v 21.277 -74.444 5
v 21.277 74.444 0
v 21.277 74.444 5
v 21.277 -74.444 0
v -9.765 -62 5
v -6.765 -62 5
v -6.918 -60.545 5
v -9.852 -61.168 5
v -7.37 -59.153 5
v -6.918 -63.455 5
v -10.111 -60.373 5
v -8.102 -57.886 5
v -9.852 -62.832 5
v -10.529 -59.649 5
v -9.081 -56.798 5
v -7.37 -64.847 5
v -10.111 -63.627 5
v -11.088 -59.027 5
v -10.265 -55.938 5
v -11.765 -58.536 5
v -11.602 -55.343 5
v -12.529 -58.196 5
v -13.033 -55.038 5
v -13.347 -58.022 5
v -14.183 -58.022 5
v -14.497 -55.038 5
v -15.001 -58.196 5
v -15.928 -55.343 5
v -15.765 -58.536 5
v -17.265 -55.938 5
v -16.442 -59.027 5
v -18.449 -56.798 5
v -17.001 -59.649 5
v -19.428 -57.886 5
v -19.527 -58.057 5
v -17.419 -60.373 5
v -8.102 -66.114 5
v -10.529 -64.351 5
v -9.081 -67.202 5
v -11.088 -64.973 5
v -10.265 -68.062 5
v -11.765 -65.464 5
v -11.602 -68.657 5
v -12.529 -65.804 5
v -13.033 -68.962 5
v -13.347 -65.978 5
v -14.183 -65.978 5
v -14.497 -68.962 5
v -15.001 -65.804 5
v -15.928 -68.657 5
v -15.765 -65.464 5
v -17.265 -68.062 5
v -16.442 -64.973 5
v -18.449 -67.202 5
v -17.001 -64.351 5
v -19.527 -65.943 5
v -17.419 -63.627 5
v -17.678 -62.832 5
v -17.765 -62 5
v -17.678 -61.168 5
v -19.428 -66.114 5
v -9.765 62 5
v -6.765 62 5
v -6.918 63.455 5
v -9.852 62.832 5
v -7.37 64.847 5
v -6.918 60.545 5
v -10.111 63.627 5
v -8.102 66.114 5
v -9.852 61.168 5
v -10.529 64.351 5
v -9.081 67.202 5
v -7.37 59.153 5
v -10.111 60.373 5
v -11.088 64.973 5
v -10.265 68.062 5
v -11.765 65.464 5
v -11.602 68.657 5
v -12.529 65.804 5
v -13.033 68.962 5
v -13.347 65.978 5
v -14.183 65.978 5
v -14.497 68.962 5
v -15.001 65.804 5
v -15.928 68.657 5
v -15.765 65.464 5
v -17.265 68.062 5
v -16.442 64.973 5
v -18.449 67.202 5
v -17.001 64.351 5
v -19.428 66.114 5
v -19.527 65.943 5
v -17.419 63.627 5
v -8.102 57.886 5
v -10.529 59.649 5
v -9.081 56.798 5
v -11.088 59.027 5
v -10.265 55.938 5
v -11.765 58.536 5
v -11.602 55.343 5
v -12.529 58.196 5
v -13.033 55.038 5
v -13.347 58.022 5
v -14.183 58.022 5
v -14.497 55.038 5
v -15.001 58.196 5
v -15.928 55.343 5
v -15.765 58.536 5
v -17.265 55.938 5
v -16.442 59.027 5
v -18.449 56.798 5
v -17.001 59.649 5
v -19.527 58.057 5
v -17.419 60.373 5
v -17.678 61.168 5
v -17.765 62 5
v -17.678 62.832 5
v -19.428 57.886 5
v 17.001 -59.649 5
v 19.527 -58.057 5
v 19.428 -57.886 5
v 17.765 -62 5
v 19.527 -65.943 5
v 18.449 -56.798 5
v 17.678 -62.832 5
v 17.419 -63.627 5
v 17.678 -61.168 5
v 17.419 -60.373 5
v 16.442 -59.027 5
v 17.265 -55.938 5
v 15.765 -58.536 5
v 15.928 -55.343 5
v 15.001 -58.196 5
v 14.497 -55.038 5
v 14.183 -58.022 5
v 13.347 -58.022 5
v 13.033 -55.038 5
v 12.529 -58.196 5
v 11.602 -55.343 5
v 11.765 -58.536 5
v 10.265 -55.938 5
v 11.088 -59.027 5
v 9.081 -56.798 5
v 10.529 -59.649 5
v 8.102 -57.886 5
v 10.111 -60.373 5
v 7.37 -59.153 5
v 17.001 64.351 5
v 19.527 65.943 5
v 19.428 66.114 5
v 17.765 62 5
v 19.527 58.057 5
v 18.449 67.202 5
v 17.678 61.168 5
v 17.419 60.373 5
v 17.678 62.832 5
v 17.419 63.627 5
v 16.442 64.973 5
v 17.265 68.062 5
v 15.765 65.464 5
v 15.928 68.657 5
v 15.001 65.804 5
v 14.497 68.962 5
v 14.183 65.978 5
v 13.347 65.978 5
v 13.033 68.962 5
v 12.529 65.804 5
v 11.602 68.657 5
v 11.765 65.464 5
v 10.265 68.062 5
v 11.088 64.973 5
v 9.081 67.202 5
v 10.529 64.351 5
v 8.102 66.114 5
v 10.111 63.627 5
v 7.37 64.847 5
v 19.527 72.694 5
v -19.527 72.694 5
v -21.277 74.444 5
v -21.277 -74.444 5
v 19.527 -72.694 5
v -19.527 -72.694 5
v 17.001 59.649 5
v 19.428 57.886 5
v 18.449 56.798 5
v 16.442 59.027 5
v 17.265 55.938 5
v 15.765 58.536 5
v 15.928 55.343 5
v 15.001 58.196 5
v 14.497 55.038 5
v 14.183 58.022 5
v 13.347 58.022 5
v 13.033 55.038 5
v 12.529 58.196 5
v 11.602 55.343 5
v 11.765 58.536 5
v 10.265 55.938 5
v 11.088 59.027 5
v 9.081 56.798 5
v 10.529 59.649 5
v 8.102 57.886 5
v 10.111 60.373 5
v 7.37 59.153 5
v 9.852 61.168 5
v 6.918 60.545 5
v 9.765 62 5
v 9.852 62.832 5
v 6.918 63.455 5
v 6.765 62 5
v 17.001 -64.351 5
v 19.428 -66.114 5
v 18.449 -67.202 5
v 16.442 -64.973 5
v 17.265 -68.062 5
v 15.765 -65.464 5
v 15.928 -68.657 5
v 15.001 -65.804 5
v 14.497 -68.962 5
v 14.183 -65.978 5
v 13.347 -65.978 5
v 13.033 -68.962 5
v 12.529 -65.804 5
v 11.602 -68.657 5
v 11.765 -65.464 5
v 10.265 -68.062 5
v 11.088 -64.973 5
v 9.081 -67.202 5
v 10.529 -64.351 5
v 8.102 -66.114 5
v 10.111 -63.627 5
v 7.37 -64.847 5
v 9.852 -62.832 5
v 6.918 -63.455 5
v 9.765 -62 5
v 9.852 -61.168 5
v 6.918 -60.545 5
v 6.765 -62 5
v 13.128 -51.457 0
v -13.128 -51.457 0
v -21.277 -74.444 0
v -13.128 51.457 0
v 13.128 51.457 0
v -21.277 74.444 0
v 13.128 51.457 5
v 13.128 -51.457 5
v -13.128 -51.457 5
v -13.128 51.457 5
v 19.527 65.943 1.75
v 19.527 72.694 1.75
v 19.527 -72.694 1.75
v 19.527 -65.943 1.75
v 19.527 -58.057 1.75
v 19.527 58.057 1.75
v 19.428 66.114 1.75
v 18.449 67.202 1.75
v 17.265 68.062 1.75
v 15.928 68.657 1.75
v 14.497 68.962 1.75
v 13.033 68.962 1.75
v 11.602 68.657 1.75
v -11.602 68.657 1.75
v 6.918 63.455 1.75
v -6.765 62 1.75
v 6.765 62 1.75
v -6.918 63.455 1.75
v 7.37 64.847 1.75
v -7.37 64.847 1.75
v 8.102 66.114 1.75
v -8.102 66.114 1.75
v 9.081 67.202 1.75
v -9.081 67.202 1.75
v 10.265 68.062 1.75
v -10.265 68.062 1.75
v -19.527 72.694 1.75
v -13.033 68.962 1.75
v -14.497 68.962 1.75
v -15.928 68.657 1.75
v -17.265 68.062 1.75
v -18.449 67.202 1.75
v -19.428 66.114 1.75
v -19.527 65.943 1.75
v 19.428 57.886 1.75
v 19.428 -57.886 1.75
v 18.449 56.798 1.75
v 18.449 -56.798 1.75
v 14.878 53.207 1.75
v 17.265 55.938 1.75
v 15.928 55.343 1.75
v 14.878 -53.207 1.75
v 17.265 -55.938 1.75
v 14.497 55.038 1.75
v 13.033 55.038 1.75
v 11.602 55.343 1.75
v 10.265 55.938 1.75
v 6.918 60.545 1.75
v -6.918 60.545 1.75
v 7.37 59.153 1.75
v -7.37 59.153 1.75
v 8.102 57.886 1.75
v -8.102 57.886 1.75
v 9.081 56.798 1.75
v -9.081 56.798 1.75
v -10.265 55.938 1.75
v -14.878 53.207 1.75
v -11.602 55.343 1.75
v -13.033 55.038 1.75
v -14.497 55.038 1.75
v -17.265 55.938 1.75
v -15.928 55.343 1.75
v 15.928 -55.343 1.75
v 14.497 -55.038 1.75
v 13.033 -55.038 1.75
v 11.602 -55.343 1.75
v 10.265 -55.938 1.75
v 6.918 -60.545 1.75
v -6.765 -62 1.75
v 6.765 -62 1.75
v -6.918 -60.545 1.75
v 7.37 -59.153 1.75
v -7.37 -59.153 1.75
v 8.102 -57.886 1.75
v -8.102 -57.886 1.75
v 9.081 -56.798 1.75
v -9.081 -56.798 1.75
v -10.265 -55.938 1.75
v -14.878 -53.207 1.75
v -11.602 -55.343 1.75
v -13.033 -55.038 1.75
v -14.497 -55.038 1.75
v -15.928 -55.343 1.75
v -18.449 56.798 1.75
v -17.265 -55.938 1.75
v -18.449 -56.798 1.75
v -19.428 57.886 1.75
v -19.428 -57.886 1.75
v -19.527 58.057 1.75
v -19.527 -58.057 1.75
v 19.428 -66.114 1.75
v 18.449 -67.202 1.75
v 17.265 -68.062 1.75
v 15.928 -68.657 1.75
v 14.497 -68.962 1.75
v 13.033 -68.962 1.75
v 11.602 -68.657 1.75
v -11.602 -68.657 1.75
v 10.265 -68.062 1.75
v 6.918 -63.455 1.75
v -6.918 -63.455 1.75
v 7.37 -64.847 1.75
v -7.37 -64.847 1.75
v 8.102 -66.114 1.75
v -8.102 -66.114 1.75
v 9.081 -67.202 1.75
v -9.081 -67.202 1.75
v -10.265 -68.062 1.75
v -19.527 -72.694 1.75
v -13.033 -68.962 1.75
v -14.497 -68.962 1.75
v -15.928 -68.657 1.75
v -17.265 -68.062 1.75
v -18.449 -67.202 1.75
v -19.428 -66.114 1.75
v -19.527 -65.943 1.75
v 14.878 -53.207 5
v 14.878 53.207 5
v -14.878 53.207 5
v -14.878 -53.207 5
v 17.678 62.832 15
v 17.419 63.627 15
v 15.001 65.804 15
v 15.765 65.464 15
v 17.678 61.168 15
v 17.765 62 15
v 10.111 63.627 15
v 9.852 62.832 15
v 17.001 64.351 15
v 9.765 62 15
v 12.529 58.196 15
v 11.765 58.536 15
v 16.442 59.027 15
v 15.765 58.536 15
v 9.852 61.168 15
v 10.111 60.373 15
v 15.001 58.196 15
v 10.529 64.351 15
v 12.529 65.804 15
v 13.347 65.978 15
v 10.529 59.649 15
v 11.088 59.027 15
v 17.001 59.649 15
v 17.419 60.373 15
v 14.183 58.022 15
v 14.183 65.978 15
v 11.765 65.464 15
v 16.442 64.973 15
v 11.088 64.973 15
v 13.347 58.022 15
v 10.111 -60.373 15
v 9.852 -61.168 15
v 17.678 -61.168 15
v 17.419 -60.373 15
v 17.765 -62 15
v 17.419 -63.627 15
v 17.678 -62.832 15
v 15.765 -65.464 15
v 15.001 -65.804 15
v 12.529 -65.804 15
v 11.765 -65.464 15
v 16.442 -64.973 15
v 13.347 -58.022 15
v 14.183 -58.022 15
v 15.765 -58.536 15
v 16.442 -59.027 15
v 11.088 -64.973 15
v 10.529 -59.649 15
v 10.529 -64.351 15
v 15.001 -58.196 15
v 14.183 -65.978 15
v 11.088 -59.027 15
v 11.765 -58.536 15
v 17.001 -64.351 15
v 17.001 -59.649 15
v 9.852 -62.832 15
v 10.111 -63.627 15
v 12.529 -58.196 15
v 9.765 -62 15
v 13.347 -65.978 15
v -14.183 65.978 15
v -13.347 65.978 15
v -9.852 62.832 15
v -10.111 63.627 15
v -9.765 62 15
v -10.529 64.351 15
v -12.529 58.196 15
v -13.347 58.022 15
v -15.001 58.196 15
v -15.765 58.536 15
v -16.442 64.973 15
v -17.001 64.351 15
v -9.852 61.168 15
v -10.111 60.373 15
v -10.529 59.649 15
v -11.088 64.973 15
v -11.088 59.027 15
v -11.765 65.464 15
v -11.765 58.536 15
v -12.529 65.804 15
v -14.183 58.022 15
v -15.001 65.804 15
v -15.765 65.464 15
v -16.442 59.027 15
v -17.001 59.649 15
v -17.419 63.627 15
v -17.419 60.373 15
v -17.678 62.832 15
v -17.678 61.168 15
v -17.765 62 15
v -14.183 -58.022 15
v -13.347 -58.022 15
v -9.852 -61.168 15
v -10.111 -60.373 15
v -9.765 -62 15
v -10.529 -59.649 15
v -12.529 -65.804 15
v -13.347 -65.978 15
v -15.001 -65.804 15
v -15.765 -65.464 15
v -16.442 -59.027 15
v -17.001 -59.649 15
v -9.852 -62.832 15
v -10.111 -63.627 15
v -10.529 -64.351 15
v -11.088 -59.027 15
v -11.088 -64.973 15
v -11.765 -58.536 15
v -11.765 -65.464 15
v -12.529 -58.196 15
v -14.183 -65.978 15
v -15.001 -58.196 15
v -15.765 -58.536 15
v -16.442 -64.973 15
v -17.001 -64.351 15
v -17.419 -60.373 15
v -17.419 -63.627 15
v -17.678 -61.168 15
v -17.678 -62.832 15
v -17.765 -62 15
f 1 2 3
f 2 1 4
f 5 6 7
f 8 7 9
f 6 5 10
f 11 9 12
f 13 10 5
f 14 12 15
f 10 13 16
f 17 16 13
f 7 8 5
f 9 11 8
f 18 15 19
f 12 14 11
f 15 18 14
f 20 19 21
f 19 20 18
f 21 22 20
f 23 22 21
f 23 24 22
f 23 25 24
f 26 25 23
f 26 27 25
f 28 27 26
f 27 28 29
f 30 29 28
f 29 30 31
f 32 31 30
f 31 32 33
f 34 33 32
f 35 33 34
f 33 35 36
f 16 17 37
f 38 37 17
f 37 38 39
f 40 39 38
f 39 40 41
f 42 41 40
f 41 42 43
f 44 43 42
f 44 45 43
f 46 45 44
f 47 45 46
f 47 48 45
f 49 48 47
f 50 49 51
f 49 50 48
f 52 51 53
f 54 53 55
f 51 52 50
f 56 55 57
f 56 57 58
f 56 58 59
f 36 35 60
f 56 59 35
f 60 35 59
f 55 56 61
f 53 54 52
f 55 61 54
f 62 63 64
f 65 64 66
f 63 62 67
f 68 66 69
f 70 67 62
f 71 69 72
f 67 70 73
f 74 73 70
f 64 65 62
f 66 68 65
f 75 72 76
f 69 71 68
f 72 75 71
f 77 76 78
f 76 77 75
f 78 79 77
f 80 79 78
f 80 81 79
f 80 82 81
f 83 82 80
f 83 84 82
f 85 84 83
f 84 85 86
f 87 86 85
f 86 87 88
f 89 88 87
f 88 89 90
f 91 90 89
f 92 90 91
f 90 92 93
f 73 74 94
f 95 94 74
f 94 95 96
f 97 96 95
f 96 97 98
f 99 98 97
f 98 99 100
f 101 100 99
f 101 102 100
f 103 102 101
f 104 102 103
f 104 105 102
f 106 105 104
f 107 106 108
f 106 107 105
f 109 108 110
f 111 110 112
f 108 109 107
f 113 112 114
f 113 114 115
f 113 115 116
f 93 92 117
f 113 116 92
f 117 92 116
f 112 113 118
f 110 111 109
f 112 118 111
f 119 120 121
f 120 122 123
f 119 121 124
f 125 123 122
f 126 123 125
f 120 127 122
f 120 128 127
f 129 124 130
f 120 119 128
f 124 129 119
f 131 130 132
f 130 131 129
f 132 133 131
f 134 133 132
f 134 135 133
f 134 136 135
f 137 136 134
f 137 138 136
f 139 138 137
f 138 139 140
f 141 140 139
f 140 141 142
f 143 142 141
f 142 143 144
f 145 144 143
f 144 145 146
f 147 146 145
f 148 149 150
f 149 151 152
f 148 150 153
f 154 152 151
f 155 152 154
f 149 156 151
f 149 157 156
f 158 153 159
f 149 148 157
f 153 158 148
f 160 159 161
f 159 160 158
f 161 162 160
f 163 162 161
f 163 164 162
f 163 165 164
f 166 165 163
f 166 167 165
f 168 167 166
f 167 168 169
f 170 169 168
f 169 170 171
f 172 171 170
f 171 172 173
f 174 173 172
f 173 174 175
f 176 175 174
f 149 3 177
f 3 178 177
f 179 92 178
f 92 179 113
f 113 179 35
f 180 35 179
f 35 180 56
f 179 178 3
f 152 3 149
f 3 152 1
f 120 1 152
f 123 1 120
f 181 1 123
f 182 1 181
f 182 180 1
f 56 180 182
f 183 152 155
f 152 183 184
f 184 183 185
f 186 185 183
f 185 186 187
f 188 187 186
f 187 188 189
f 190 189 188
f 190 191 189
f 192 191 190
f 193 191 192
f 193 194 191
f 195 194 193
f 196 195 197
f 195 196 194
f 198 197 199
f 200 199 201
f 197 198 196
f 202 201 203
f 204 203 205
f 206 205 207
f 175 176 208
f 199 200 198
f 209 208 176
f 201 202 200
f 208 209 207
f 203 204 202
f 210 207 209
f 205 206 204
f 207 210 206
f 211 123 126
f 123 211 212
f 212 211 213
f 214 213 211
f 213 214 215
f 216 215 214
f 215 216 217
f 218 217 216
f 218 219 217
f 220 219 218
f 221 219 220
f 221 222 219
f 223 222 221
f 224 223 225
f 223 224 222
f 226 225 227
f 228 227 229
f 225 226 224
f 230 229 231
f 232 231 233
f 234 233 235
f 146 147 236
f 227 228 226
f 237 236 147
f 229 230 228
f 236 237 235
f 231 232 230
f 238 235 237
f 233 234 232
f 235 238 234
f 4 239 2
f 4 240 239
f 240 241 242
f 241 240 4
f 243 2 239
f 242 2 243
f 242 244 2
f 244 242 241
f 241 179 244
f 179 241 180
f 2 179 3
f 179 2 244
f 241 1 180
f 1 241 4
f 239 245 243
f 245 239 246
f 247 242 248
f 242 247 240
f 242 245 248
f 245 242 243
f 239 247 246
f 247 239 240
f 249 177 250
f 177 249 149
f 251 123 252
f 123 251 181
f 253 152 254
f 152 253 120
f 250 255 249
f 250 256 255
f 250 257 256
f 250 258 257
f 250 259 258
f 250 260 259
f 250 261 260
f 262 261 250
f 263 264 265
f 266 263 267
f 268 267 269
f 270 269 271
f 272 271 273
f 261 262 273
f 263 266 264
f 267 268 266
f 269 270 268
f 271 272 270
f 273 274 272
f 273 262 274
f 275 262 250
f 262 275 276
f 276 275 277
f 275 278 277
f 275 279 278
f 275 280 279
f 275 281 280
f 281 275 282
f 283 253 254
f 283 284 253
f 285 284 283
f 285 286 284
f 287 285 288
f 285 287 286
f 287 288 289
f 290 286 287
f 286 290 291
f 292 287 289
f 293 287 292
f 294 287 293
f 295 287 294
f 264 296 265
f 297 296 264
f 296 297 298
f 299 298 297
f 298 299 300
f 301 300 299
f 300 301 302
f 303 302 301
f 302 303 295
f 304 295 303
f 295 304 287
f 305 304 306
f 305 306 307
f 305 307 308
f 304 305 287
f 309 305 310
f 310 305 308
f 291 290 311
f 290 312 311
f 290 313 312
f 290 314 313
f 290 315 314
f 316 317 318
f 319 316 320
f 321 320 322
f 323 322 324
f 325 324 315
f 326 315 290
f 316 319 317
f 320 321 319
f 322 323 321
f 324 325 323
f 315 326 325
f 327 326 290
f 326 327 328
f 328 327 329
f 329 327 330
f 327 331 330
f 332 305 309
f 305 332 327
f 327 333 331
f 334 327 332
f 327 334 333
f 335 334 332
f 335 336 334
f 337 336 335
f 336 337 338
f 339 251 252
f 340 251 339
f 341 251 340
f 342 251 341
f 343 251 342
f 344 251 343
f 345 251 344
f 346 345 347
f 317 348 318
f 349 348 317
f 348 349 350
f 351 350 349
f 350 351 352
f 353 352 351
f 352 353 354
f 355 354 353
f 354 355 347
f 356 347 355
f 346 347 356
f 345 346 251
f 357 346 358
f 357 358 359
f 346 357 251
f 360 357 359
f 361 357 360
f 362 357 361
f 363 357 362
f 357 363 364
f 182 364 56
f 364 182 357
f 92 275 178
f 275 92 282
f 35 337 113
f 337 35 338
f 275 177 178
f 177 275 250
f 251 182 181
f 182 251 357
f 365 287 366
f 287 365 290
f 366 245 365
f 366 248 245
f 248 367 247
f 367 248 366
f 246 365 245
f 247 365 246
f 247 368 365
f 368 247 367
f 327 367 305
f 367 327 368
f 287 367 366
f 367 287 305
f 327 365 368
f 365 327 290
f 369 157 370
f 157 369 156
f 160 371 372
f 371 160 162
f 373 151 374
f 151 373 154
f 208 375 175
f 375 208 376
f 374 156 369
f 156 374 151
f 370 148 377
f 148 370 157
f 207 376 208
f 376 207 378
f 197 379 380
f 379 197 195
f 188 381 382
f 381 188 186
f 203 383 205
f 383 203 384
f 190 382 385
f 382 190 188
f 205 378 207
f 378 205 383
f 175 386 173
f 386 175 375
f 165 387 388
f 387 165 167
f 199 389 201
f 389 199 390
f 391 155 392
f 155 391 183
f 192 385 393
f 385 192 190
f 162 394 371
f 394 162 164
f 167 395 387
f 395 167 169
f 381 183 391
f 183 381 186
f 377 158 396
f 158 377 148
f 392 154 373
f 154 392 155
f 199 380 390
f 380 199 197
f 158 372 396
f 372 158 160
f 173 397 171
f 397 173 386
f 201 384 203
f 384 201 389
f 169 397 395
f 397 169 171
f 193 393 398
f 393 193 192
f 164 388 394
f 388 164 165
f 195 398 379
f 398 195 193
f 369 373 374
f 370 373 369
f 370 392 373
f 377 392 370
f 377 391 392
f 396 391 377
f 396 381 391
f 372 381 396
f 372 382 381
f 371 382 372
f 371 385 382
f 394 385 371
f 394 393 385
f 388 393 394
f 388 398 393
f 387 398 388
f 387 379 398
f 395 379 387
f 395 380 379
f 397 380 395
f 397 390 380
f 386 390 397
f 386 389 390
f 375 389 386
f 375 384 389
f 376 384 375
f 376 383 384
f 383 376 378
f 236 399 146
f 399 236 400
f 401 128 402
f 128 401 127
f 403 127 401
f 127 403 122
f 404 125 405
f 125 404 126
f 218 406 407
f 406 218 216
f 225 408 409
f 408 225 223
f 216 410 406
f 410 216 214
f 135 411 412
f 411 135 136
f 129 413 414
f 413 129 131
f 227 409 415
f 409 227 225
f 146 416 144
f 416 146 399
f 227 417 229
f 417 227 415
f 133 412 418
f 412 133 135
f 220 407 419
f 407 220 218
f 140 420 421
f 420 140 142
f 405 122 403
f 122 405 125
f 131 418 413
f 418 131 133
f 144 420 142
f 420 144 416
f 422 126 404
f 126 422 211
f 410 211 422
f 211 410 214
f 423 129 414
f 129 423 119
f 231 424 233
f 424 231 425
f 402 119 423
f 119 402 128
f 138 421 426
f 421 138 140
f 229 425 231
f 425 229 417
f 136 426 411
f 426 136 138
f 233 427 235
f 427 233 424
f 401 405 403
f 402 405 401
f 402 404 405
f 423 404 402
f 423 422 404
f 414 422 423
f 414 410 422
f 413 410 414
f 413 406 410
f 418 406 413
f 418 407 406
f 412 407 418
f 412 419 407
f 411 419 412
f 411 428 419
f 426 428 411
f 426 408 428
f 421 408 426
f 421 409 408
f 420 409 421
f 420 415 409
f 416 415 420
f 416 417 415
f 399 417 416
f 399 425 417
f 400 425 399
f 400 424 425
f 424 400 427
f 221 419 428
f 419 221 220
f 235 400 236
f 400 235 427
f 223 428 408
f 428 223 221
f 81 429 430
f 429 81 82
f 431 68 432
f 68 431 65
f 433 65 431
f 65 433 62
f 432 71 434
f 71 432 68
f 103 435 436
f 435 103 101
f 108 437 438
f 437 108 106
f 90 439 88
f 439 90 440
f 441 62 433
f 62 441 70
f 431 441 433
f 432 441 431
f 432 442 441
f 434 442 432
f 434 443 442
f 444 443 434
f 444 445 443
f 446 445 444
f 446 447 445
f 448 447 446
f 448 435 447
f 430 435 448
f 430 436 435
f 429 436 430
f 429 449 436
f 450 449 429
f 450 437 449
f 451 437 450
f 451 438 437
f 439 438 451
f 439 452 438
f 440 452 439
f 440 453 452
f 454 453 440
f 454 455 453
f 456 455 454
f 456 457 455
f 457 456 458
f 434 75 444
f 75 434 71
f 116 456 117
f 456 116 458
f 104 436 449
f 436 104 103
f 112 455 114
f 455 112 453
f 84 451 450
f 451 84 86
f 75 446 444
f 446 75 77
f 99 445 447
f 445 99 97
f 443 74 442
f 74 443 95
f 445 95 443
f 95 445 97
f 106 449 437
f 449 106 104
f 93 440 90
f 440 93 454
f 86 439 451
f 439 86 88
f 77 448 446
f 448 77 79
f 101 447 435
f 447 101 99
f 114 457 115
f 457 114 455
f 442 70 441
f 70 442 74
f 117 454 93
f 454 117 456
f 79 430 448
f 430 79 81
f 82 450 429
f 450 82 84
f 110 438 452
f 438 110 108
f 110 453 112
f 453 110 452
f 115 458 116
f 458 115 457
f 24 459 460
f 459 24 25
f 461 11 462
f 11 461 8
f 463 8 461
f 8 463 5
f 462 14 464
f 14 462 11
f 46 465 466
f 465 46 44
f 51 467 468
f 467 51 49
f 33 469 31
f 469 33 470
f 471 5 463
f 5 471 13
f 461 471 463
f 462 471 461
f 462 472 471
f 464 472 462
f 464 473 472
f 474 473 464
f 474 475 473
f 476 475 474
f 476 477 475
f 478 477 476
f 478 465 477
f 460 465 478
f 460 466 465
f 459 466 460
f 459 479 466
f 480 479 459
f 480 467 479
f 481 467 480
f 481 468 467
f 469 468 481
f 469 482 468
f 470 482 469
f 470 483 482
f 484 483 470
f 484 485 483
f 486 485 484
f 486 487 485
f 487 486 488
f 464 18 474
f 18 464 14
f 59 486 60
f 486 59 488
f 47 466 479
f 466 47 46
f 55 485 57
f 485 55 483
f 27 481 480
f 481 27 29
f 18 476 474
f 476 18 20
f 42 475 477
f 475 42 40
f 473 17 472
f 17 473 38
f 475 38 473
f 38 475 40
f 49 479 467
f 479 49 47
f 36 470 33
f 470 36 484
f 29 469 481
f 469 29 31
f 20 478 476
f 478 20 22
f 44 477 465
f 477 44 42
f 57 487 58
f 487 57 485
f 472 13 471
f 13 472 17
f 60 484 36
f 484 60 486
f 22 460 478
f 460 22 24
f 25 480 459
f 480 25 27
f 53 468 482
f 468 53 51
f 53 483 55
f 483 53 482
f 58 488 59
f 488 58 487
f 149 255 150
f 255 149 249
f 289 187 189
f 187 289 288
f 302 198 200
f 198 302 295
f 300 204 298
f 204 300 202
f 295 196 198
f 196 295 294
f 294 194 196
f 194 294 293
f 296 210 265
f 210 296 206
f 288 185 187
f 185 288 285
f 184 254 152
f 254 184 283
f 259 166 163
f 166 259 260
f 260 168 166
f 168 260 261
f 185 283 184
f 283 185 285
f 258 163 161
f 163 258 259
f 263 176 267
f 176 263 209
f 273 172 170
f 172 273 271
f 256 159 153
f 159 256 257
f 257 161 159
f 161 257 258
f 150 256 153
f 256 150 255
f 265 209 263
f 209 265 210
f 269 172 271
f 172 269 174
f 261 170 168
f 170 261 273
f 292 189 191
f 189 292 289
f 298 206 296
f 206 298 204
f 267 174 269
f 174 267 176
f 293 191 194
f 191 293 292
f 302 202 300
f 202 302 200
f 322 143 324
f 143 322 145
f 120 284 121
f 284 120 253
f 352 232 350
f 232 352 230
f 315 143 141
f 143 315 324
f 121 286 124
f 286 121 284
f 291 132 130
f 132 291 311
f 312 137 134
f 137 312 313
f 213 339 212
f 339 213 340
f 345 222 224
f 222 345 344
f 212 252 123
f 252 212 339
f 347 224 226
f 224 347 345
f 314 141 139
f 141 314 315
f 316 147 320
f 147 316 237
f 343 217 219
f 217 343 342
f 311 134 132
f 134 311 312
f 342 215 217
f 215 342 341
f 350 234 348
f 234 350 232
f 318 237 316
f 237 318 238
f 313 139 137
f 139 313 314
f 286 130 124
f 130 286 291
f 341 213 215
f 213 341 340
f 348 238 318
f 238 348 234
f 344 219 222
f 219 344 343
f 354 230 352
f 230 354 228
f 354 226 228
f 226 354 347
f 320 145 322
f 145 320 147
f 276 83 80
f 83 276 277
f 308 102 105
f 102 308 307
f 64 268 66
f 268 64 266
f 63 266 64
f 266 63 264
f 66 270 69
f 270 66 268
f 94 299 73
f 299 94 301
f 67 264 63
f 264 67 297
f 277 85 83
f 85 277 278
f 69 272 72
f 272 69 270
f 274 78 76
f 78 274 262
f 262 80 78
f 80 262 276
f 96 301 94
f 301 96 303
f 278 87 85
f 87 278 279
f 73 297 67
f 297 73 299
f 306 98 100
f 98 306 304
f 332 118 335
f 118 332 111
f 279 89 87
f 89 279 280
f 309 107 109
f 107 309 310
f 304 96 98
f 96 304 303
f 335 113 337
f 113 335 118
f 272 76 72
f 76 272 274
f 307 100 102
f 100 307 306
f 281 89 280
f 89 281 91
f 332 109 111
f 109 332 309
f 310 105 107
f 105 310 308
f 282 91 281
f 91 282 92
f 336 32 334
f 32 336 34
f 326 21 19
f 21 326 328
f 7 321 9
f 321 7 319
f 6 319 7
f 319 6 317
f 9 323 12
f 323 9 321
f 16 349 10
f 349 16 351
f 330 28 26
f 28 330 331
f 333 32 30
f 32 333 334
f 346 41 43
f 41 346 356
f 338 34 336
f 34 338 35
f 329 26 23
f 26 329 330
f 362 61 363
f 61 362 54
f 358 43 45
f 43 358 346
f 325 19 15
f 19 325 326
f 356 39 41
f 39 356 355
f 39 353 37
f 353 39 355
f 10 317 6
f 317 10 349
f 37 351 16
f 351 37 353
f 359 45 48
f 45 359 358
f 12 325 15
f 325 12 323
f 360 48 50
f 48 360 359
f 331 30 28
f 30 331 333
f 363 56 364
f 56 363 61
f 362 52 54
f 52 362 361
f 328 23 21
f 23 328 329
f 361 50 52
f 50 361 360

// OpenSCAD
// 3.5 inch Drive to 5.25 inch Front Bay Bracket Adapter 
// Part 2: front bezel

sf=0.006;                  // shrinkage factor (ABS shrinks approximatly 0.5%-0.7% when it cools) 
tb=5;                      //thickness of the bezel
h3=26.1*(1+sf);                 //hight of 3.5" hole (25.4-26.1)
w3=102.3*(1+sf);              //width of 3.5" hole (101.6-102.3)
hb5=42.3*(1+sf);             //hight of bezel
wb5=148*(1+sf);              //width of bezel
f=30;                     // $fn=
wt=1.75;               // wall thickness


 difference() {
        union() {
            // bezel plate:
            translate([0,0,tb/2]) cube([hb5,wb5,tb], center=true);
        }
            // bezel hole:
            translate([0,0,tb/2]) cube([h3,w3,tb+2], center=true);
            // remove inside part of bezel:
            translate([0,0,tb/2+wt]) cube([hb5-2*wt,wb5-2*wt,tb], center=true);
    }
    
    // inner surround:
difference() {
             // add inner surround:
             translate([0,0,tb/2]) cube([h3+2*wt,w3+2*wt,tb], center=true);
             // remove bezel hole:
            translate([0,0,tb/2]) cube([h3,w3,tb+2], center=true);
    }
    
             // pins:
            translate([13.765,62,7.5])  cylinder(15,4,4, center=true, $fn=f);
            translate([13.765,-62,7.5])  cylinder(15,4,4, center=true, $fn=f);
            translate([-13.765,62,7.5])  cylinder(15,4,4, center=true, $fn=f);
            translate([-13.765,-62,7.5])  cylinder(15,4,4, center=true, $fn=f);
            // pin base:
            translate([13.765,62,2.5])  cylinder(5,7,7, center=true, $fn=f);
            translate([13.765,-62,2.5])  cylinder(5,7,7, center=true, $fn=f);
            translate([-13.765,62,2.5])  cylinder(5,7,7, center=true, $fn=f);
            translate([-13.765,-62,2.5])  cylinder(5,7,7, center=true, $fn=f);
    
